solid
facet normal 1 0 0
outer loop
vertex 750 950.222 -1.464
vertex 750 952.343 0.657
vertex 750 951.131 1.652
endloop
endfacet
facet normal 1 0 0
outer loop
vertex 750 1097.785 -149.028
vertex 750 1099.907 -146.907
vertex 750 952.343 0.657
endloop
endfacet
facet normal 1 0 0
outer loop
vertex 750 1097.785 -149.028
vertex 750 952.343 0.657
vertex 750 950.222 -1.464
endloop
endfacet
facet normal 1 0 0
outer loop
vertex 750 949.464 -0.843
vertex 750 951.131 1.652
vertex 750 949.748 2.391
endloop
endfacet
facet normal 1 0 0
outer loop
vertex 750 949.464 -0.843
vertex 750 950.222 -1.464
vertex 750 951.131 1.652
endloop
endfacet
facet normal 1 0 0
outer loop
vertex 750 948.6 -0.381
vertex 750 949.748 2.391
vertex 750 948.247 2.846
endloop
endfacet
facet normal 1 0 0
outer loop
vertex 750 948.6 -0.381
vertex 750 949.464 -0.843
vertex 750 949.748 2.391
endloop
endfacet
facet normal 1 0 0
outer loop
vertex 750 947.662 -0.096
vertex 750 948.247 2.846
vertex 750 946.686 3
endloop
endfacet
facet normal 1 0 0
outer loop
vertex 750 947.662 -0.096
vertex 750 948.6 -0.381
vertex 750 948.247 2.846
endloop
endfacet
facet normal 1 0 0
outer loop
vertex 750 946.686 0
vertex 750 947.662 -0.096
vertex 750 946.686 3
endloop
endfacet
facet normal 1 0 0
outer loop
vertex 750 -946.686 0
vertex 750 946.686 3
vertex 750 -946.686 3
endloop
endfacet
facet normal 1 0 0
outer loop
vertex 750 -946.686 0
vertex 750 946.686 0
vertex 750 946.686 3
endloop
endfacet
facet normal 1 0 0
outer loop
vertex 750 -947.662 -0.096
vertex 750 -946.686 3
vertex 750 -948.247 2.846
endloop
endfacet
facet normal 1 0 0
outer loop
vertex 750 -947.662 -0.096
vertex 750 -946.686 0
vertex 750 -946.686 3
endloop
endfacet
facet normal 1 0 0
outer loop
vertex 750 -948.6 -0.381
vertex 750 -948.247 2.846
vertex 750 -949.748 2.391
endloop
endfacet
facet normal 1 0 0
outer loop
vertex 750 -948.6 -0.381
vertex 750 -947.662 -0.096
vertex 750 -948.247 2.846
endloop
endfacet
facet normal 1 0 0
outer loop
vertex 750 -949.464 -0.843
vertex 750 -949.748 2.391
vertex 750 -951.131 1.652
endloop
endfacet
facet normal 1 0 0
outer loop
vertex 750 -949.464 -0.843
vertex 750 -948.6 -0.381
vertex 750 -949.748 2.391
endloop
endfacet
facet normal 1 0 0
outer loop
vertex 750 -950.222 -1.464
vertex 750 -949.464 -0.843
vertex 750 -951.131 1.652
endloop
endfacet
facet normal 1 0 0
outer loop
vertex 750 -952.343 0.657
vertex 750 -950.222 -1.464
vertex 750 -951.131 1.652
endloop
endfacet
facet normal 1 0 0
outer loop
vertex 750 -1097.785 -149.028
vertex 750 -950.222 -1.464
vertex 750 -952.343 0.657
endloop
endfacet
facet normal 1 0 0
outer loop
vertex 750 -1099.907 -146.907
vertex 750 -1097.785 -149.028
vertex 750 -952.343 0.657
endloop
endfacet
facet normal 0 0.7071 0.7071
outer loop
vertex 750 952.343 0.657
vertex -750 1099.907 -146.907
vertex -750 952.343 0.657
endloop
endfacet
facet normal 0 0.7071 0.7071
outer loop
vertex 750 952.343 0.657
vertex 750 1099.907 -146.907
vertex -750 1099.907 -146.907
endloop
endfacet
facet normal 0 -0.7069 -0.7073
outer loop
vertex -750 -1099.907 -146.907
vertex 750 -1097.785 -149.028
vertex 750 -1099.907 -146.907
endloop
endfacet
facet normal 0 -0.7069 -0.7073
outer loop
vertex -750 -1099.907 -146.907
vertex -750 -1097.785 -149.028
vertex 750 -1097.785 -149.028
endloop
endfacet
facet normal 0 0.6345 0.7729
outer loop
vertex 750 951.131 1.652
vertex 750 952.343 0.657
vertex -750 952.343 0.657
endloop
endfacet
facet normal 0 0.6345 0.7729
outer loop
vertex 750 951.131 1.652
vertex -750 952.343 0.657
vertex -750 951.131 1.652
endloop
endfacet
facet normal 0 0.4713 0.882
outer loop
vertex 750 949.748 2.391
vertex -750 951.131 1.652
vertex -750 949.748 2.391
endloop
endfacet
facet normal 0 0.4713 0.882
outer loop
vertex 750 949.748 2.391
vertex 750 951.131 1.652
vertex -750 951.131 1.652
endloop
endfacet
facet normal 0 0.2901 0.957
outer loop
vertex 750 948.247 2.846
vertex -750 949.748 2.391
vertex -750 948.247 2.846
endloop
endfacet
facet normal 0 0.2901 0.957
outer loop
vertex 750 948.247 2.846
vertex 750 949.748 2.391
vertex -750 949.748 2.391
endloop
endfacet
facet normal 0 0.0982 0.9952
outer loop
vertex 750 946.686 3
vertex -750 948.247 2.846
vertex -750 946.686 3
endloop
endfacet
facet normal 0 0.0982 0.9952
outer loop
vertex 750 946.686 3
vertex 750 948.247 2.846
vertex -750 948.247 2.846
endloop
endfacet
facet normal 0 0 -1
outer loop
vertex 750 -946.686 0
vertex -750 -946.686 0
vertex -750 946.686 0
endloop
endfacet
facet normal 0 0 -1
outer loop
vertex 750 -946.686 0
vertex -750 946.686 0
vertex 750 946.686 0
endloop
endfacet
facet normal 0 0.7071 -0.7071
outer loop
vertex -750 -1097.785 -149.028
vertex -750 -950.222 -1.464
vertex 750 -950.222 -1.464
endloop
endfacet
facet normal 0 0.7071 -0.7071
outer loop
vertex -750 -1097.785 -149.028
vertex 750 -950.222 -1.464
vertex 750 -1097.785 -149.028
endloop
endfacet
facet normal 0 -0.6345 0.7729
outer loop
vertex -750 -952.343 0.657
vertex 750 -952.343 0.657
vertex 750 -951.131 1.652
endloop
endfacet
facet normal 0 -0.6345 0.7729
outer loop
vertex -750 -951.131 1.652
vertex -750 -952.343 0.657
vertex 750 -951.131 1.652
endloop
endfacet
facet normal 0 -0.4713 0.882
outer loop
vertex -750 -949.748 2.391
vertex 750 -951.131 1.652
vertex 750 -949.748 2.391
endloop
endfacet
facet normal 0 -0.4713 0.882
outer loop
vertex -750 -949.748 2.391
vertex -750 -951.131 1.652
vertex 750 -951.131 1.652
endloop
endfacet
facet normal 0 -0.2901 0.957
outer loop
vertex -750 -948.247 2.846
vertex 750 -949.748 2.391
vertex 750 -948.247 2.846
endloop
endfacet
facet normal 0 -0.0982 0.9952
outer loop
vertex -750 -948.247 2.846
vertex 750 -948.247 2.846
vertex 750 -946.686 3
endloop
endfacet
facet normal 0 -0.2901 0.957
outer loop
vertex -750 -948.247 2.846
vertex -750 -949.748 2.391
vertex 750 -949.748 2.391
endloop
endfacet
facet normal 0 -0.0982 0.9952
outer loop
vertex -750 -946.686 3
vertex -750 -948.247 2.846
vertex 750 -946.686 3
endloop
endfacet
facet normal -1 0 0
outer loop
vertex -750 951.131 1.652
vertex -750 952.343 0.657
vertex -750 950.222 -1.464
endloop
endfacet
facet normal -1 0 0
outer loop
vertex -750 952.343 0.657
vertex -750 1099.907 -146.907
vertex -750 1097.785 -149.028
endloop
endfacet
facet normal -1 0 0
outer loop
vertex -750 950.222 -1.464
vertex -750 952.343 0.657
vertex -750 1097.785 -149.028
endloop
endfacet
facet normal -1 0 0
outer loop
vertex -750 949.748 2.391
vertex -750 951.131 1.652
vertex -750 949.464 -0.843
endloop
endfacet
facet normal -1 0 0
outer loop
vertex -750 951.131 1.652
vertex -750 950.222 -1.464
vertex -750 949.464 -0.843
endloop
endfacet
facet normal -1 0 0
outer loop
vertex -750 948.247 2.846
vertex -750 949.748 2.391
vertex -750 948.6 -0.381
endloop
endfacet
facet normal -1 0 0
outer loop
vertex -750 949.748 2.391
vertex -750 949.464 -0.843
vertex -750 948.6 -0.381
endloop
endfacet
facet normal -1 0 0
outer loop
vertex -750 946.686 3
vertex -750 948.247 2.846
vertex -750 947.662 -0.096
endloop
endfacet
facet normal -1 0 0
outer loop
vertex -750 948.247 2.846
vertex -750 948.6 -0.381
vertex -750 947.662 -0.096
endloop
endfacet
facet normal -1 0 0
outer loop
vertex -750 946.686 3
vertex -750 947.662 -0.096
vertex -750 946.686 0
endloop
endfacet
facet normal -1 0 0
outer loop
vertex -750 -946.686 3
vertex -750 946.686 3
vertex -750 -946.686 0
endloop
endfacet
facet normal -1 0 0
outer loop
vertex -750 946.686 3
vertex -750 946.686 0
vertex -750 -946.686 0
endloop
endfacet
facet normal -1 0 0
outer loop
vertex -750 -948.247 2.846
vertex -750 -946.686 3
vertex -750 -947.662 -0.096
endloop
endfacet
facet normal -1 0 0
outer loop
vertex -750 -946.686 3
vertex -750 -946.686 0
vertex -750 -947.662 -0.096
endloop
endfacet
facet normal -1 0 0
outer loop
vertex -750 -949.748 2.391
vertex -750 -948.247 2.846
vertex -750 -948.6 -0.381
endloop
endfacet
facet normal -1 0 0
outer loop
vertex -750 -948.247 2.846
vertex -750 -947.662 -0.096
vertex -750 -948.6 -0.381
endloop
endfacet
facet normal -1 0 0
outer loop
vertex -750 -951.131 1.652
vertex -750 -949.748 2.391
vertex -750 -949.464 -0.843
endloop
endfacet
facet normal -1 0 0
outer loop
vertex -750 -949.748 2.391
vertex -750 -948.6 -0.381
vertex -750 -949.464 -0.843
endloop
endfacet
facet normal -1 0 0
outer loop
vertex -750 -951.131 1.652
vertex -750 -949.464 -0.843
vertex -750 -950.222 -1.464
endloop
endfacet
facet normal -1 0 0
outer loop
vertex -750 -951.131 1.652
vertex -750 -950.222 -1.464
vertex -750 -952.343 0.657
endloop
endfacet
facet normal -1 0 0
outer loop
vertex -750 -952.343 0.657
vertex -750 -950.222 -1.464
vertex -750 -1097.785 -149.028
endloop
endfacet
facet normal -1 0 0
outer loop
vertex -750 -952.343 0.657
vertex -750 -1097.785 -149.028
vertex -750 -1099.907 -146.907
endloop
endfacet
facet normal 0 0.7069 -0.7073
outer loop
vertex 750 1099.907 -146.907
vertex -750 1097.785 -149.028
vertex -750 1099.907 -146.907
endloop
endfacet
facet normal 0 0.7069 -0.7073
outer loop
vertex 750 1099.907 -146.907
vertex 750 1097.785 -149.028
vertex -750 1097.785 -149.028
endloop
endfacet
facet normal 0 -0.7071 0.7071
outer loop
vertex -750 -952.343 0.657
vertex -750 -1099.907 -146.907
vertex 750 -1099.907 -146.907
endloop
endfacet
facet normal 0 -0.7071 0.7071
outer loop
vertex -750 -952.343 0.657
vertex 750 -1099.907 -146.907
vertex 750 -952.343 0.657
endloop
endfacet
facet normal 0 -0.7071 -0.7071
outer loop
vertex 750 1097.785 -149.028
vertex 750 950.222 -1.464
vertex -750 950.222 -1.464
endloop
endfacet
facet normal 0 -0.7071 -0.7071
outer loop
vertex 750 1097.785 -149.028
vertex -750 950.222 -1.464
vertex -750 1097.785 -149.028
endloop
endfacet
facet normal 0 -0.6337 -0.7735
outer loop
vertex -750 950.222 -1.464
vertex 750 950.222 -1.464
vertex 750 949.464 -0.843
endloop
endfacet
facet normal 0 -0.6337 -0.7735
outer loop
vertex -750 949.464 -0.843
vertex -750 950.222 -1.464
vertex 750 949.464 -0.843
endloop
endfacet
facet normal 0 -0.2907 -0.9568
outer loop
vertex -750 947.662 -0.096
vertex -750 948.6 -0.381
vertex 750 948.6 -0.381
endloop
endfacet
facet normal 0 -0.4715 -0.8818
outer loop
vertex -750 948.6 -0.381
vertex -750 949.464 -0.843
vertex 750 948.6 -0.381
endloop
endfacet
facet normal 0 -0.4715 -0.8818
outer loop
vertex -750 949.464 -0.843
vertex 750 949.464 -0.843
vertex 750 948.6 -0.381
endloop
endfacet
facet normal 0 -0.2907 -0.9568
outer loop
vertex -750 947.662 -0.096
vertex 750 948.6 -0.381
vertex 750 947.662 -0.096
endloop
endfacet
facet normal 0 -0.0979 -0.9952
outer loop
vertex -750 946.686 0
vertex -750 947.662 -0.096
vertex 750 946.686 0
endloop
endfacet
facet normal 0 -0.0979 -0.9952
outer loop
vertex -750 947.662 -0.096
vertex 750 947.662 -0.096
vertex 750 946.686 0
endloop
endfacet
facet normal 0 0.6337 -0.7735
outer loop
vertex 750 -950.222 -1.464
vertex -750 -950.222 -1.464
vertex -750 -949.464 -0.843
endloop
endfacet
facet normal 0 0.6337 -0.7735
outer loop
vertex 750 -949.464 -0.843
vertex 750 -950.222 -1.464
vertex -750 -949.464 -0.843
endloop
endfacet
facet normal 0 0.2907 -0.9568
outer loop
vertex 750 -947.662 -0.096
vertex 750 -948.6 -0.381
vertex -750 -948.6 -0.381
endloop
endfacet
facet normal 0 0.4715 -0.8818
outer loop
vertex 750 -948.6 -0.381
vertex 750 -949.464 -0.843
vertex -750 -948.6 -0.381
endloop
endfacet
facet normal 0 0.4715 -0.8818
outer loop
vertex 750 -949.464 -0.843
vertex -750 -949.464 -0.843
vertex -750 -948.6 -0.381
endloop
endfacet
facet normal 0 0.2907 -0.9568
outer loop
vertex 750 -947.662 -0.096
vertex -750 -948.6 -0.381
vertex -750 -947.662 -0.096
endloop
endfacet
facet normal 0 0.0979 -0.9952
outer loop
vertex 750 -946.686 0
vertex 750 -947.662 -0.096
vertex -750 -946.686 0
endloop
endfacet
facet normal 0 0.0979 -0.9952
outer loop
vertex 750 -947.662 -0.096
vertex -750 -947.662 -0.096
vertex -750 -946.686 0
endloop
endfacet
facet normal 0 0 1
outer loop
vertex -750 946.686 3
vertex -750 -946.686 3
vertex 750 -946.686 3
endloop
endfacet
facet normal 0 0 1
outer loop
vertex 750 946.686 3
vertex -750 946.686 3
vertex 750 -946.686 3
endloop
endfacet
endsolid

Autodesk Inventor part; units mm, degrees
ref_plane "YZ Plane" through (0, 0, 0) normal (1, 0, 0) x (0, 1, 0)
ref_plane "XZ Plane" through (0, 0, 0) normal (0, 1, 0) x (-1, 0, 0)
ref_plane "XY Plane" through (0, 0, 0) normal (0, 0, 1) x (1, 0, 0)
sketch "Sketch1" plane through (0, 0, 0) normal (0, 0, 1) x (1, 0, 0)
  line L0 (-750, -950) -> (750, -950)
  line L1 (750, -950) -> (750, 950)
  line L2 (750, 950) -> (-750, 950)
  line L3 (-750, 950) -> (-750, -950)
  line L4 (-750, -950) -> (750, 950) construction
  line L5 (750, -950) -> (-750, 950) construction
  point P0 (0, 0)
  dimension "d0" = 1500
  dimension "d1" = 1900
extrude "Plate1" add sketch "Sketch1" along normal blind 3
sketch "Sketch2" plane through (750, 947.8787, 0.8787) normal (0, 0.7071068, 0.7071068) x (-1, 0, 0)
  line L0 (1500, 0) -> (0, 0)
  line L1 (0, 0) -> (0, -212)
  line L2 (0, -212) -> (1500, -212)
  line L3 (1500, -212) -> (1500, 0)
edge flange "Flange1" height 212 angle 45 thickness 3 bend radius 5 thickness toward (0, 0.7071068, 0.7071068) relief round relief width 3 relief depth 1.5 corner gap 5 corner form 0 edges at (0, 950, 0) (0, -950, 0) wall of the first edge with corners at (-750, 947.8787, 0.8787) (750, 947.8787, 0.8787) (750, 1097.7853, -149.028) (-750, 1097.7853, -149.028)
bend "Bend1"
corner "Corner1"
equation "\"d2\" = Thickness"
equation "\"d3\" = BendReliefWidth"
equation "\"d4\" = BendReliefDepth"
equation "\"d5\" = MinimumRemnant"
equation "\"d6\" = TransitionRadius"
equation "\"d9\" = BendRadius"
equation "\"d10\" = CornerReliefSize"
equation "\"d11\" = GapSize"
equation "\"d12\" = JacobiRadiusSize"
equation "\"BendReliefWidth\" = Thickness"
equation "\"BendReliefDepth\" = 0.5 * Thickness"
equation "\"CornerReliefSize\" = 4 * Thickness"
equation "\"MinimumRemnant\" = 2 * Thickness"
equation "\"TransitionRadius\" = BendRadius"
equation "\"JacobiRadiusSize\" = BendRadius"
equation "\"GapSize\" = Thickness"
equation "\"Thickness\" = 3"
equation "\"BendRadius\" = 5"
properties part number "BSH 010 floor 1" material "09g2s"
